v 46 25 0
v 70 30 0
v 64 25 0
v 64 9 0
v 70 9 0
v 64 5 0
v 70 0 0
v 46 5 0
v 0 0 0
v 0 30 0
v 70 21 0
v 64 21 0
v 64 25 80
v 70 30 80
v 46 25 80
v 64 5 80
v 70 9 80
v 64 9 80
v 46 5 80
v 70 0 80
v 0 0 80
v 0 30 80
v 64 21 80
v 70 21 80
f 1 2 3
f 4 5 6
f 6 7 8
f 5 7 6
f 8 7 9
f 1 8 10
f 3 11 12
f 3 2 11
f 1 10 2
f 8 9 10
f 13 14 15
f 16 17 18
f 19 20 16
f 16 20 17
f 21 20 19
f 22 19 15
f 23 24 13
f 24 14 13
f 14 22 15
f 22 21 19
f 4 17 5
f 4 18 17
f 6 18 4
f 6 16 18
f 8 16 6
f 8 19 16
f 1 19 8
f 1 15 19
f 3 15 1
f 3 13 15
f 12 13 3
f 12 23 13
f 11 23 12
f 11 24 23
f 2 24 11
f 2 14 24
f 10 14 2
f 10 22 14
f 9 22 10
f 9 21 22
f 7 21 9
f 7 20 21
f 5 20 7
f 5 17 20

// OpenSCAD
$fn = 32;

// ----------------------------------------------------------------------
// T-slot rail: 70 x 30 mm section, 80 mm long
// ----------------------------------------------------------------------

// --- parameters (mm) ---
profile_height = 80;      // extrusion height
profile_points = 12;      // points of the closed outline

profile = [[0, 0], [70, 0], [70, 9], [64, 9], [64, 5], [46, 5], [46, 25], [64, 25], [64, 21], [70, 21], [70, 30], [0, 30]];  // single closed polygon, 12 points, counter clockwise

// --- the one profile operation ---
linear_extrude(height = profile_height) polygon(points = profile);
